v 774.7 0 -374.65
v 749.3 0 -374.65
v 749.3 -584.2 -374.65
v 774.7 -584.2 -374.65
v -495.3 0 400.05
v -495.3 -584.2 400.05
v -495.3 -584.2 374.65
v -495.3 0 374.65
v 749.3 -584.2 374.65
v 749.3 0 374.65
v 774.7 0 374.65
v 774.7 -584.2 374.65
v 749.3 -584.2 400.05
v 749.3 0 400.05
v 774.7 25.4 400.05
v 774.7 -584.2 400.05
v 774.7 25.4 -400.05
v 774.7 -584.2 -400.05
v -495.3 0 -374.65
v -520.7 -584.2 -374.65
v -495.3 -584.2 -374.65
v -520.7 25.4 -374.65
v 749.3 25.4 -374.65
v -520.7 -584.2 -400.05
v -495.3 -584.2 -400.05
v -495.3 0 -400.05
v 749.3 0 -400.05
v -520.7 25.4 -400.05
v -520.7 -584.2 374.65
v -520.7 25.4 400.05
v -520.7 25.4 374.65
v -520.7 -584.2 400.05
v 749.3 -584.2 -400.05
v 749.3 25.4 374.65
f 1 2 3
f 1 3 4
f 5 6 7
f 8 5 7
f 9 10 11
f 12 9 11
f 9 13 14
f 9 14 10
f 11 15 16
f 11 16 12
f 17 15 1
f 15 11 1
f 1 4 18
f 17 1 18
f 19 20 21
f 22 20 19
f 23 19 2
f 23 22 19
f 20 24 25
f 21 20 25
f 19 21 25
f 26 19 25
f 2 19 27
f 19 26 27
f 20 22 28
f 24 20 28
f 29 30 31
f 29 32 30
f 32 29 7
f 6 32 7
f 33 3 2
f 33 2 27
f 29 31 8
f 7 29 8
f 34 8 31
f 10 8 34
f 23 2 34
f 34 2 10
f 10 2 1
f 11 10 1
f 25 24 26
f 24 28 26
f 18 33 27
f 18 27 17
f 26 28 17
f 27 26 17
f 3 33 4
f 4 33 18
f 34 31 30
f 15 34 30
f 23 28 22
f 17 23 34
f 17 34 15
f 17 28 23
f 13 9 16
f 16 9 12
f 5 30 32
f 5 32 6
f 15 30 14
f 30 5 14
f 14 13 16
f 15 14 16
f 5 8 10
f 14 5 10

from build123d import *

# Parameters (mm, degrees)
SKETCH1_W           = 1270
SKETCH1_H           = 25.4
BOSS_EXTRUDE1_DEPTH = 25.4
SKETCH2_W           = 25.4
SKETCH2_H           = 25.4
BOSS_EXTRUDE2_DEPTH = 584.2


with BuildPart() as part:
    # Sketch1 → Boss-Extrude1 (new body)
    with BuildSketch(Plane(origin=(0, 0, 0), x_dir=(1, 0, 0), z_dir=(0, 1, 0))):
        with Locations((114.3, -387.35)):
            Rectangle(SKETCH1_W, SKETCH1_H)
        Polygon((749.3, 374.65), (749.3, -374.65), (749.3, -400.05), (774.7, -400.05), (774.7, 400.05), (749.3, 400.05), align=None)
        with Locations((114.3, 387.35)):
            Rectangle(SKETCH1_W, SKETCH1_H)
    extrude(amount=BOSS_EXTRUDE1_DEPTH)

    # Sketch2 → Boss-Extrude2 (add)
    with BuildSketch(Plane(origin=(0, 0, 0), x_dir=(1, 0, 0), z_dir=(0, 1, 0))):
        with Locations((-508, 387.35)):
            Rectangle(SKETCH2_W, SKETCH2_H)
        with Locations((762, 387.35)):
            Rectangle(SKETCH2_W, SKETCH2_H)
        with Locations((762, -387.35)):
            Rectangle(SKETCH2_W, SKETCH2_H)
        with Locations((-508, -387.35)):
            Rectangle(SKETCH2_W, SKETCH2_H)
    extrude(amount=-BOSS_EXTRUDE2_DEPTH)


solid = part.part
